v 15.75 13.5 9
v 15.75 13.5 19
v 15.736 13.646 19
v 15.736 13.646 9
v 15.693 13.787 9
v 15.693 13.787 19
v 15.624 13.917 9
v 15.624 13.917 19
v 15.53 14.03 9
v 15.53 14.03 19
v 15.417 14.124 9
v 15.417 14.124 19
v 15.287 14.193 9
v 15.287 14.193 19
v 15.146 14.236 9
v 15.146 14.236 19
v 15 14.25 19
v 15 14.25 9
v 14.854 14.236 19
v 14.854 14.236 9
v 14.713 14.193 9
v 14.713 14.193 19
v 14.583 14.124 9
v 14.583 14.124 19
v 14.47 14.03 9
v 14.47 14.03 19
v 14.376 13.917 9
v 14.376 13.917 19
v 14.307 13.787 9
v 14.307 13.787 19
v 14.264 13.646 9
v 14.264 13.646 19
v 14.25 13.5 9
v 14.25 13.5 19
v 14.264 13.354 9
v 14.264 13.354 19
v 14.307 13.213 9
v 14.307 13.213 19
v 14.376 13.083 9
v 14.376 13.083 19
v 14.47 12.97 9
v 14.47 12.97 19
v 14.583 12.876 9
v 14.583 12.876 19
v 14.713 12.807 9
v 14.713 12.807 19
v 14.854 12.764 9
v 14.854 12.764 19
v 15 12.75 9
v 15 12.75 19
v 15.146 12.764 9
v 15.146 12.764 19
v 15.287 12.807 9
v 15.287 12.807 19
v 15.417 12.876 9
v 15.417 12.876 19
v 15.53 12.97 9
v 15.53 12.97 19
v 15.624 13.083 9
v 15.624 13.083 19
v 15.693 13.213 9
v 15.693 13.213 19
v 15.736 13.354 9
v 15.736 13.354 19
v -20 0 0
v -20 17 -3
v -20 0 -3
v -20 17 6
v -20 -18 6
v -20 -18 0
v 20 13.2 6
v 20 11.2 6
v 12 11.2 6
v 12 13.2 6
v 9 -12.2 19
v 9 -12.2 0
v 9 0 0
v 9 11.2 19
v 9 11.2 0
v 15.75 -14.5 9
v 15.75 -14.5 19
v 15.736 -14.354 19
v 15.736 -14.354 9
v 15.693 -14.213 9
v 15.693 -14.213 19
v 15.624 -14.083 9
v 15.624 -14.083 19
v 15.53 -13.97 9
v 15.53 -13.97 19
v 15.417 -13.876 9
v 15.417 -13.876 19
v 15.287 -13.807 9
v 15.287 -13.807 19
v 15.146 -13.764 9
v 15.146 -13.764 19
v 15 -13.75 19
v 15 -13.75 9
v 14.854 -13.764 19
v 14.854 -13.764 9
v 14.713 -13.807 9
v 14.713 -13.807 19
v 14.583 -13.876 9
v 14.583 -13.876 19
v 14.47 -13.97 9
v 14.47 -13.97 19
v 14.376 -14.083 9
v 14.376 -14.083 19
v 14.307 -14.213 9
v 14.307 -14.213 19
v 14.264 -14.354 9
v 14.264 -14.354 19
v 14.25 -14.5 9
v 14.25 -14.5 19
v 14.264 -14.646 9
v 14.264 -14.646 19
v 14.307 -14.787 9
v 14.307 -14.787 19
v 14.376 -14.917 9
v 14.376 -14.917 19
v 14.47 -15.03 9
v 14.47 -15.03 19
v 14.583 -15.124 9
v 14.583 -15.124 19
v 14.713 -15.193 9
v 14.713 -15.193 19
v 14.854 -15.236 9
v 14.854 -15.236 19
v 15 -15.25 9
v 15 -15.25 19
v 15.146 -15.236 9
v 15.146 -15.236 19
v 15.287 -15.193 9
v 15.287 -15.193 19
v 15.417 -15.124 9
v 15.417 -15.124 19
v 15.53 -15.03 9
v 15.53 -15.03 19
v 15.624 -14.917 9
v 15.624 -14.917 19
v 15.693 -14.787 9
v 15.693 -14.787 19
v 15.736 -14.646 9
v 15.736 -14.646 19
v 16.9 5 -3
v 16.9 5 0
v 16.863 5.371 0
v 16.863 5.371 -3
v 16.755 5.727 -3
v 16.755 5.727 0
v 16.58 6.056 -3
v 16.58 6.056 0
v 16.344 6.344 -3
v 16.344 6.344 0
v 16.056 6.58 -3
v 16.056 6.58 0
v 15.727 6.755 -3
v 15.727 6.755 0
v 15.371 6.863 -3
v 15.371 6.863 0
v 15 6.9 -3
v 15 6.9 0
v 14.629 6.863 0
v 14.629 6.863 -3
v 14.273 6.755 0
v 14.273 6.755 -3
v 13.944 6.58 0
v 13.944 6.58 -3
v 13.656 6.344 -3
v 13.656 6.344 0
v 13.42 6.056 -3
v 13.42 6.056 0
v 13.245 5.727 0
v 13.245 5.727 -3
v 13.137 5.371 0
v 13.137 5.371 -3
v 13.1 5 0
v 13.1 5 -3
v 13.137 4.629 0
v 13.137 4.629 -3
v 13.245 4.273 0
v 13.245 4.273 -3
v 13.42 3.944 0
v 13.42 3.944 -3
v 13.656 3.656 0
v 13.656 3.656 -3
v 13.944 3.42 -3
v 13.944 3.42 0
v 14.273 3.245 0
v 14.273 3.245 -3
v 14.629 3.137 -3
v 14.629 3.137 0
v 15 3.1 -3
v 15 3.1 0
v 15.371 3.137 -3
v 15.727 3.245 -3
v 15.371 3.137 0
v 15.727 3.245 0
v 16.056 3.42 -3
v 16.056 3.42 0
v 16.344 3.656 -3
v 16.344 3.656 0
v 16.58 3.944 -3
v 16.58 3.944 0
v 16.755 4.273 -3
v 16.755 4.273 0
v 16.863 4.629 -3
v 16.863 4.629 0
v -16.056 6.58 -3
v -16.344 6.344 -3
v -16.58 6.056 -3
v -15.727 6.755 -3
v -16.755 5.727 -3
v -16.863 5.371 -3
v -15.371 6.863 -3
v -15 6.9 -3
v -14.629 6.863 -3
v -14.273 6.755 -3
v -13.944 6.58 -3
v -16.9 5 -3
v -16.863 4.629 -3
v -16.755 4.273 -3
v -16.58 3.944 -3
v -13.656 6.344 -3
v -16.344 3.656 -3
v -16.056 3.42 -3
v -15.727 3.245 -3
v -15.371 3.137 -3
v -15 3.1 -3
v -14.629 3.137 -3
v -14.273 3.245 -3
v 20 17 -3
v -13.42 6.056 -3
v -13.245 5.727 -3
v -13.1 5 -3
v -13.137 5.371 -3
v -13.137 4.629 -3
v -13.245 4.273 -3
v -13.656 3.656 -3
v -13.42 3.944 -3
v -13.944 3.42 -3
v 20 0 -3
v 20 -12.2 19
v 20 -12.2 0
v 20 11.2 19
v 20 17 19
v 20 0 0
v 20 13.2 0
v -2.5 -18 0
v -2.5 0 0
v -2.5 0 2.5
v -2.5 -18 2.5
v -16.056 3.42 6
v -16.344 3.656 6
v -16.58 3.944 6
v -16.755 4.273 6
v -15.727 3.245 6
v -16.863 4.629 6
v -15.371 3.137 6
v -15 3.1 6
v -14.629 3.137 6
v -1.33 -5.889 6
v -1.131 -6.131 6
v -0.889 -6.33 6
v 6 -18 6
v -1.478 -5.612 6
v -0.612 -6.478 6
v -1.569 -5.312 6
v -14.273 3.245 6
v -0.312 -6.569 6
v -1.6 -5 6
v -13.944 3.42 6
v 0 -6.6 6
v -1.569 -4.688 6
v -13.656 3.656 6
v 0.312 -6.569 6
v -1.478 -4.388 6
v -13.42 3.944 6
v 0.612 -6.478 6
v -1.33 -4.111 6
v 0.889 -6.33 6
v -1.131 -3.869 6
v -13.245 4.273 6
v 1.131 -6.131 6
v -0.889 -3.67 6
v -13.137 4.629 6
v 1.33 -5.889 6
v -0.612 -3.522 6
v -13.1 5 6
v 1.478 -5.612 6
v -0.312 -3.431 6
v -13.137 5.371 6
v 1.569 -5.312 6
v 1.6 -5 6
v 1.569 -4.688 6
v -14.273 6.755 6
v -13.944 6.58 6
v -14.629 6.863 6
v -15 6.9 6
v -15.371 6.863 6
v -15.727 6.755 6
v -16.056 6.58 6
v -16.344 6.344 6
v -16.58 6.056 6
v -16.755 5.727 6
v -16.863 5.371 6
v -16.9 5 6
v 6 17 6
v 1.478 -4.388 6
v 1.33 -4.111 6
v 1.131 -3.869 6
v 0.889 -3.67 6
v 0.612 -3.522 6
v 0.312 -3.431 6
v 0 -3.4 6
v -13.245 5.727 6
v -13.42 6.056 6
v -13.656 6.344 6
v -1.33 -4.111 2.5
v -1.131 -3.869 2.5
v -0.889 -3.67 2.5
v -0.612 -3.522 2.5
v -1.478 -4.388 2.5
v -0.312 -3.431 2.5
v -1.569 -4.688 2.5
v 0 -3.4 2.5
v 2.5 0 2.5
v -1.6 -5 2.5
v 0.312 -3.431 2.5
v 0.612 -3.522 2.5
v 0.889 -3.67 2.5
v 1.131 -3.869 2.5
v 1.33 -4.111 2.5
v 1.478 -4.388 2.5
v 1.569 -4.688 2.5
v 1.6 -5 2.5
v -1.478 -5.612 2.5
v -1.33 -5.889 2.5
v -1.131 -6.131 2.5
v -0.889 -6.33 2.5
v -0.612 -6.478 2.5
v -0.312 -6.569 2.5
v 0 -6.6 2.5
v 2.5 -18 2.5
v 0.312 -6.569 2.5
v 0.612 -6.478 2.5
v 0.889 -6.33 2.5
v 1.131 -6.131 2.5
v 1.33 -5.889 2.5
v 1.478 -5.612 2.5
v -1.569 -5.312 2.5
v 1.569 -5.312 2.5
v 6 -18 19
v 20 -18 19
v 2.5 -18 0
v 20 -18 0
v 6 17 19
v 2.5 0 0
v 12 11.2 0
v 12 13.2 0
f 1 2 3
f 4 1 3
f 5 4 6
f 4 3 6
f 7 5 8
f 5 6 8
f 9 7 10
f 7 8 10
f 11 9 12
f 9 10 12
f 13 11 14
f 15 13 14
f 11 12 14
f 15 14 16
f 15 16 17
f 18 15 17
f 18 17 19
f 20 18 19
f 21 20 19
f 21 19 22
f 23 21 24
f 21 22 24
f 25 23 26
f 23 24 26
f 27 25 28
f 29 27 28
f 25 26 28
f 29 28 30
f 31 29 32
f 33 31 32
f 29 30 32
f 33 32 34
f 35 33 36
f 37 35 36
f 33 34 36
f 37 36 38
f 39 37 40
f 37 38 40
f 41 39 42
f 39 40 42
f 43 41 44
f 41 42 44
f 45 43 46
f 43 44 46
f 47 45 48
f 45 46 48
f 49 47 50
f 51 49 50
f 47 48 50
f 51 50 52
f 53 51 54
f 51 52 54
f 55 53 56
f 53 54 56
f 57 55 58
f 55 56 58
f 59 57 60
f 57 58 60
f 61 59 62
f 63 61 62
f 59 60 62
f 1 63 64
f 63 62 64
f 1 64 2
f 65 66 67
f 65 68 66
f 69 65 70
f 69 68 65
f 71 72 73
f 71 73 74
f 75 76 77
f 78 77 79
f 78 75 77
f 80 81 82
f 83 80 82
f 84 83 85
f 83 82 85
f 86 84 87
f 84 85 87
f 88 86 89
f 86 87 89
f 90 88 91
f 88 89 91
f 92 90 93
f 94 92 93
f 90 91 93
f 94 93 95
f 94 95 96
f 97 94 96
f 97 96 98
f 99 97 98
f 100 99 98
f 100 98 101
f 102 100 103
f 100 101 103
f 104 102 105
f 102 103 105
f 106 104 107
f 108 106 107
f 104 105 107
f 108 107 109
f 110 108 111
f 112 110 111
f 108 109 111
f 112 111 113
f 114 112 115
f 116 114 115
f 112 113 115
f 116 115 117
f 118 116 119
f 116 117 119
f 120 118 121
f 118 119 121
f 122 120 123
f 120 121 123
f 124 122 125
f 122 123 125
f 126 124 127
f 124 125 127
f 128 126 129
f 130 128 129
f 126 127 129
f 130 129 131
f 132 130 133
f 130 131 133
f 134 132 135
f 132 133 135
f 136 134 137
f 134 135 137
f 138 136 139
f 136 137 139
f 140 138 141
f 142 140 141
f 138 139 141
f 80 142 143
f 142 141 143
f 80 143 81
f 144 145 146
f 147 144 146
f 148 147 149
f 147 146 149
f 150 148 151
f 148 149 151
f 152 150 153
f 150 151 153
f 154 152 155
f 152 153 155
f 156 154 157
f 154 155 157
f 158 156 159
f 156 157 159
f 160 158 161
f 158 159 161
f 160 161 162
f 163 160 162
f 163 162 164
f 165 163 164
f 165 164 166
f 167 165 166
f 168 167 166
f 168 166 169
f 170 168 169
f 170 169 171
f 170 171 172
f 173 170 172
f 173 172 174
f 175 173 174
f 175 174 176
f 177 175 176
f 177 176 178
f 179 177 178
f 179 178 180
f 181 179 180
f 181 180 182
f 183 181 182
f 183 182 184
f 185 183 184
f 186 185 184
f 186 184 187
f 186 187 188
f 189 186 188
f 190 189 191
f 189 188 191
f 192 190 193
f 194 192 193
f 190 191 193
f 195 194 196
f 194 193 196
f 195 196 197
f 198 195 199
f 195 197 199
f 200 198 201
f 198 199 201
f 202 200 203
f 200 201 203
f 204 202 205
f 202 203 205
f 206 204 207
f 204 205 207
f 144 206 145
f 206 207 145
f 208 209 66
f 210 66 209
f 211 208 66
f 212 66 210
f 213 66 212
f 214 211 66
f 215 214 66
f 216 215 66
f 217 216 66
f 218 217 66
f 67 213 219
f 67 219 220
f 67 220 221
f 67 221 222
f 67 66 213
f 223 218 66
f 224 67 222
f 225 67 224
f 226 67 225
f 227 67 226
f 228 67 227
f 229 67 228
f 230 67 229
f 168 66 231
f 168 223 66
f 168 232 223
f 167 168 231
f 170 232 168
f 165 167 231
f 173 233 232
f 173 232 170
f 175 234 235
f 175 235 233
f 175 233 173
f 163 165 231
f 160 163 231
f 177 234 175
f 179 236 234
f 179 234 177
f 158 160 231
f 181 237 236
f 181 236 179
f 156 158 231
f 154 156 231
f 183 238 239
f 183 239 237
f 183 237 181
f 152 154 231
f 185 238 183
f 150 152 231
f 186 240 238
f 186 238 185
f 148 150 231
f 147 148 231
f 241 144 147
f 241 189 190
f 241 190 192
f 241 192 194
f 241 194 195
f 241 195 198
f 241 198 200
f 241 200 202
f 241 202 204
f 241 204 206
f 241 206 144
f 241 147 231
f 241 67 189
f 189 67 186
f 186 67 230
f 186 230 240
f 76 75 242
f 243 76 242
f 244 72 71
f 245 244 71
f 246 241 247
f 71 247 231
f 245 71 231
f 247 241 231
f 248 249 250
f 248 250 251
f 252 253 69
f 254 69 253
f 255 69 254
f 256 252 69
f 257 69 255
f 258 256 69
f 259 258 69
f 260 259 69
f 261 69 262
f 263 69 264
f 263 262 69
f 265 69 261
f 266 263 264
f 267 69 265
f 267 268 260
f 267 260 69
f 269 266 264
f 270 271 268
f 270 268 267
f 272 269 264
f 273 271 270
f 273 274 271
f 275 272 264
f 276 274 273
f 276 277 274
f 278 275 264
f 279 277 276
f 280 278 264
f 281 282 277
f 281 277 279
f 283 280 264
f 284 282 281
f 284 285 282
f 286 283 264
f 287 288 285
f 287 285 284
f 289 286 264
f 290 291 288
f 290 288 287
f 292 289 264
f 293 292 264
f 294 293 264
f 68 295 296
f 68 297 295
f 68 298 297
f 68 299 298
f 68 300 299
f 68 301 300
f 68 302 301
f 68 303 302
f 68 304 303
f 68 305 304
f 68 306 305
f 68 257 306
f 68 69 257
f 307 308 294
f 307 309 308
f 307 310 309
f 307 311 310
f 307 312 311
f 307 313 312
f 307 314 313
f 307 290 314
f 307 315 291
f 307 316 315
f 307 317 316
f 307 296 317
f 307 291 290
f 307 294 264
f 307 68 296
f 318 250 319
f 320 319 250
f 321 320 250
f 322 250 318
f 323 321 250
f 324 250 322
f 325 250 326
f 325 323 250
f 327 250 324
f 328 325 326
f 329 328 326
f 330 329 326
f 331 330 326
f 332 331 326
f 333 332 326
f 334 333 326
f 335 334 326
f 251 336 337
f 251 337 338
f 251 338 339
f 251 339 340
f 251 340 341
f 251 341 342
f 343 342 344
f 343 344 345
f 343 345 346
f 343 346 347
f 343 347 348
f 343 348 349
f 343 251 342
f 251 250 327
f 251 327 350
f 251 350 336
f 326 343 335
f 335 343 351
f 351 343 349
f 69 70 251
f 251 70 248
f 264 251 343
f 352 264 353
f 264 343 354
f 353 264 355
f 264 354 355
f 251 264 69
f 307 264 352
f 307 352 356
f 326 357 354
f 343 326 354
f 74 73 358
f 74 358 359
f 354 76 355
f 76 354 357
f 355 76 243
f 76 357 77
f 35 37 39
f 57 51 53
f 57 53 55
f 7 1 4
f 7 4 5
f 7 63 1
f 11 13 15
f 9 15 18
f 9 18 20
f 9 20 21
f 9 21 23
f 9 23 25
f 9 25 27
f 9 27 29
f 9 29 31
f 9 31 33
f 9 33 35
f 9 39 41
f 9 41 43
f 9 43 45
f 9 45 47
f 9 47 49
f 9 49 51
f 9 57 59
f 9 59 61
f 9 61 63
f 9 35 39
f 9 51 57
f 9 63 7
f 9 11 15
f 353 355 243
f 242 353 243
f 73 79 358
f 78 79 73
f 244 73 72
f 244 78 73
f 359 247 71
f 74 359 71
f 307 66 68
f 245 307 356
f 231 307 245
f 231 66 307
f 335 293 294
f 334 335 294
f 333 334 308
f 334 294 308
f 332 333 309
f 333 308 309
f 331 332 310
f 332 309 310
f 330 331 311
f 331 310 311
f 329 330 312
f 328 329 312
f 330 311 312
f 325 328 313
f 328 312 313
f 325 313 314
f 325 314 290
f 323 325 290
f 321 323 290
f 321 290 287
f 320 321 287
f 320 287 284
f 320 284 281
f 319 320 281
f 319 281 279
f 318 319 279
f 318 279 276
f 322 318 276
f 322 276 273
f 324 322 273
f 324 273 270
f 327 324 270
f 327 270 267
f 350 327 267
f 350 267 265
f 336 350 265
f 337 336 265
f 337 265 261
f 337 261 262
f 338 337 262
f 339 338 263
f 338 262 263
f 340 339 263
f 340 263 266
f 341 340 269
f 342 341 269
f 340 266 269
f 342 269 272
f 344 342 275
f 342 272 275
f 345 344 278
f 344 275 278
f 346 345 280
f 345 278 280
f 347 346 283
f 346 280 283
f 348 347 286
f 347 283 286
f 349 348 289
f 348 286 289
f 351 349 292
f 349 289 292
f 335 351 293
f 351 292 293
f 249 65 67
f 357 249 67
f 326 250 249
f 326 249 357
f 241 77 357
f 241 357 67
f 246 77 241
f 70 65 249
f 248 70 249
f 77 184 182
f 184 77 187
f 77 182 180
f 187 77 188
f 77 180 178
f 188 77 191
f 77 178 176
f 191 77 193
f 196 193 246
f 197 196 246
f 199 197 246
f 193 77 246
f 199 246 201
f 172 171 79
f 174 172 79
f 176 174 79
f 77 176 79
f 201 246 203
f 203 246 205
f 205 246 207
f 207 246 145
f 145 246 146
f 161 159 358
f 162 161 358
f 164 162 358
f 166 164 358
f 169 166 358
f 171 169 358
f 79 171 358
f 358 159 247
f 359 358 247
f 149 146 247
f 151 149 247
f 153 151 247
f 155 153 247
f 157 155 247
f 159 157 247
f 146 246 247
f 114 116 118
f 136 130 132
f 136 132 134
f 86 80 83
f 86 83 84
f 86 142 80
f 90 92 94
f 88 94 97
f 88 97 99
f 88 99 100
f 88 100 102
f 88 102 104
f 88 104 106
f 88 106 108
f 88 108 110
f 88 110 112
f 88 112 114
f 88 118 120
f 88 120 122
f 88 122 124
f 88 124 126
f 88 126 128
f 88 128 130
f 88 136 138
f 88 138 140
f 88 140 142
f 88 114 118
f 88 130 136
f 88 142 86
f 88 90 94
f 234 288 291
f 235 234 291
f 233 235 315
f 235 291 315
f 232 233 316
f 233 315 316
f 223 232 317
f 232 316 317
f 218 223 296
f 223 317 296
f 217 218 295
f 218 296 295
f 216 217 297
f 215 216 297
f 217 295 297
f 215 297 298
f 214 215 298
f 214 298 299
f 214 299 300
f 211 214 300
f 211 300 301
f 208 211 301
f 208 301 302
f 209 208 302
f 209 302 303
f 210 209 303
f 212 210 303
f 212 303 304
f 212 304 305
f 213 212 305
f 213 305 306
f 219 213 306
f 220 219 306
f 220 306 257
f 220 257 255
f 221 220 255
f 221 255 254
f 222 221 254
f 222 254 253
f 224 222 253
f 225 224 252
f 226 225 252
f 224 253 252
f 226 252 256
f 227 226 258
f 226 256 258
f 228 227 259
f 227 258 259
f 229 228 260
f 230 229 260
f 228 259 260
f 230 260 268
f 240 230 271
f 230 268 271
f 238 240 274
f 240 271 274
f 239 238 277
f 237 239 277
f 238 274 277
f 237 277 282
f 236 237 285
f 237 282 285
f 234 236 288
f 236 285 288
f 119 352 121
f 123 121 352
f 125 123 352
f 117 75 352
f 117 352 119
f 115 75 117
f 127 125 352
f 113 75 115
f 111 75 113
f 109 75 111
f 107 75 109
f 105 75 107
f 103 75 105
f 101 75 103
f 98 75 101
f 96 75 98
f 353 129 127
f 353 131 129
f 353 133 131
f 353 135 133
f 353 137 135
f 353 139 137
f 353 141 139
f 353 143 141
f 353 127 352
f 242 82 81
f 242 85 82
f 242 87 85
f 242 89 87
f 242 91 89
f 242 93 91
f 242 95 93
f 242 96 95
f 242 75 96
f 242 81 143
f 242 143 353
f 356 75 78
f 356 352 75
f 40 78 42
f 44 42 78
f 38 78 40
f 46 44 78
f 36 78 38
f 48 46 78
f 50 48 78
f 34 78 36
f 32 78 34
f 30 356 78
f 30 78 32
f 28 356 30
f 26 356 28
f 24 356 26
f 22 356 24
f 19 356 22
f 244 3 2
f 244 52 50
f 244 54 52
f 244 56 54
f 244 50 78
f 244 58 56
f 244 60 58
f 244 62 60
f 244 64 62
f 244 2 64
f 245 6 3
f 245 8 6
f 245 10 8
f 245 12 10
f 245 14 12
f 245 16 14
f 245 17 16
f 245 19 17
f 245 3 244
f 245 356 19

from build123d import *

# Parameters (mm, degrees)
SKETCH_W        = 40
SKETCH_H        = 35
PAD_DEPTH       = 6
SKETCH002_W     = 40
SKETCH002_H     = 17
PAD001_DEPTH    = 3
SKETCH001_R     = 1.9
SKETCH001_R_2   = 1.6
POCKET_DEPTH    = 9.001
SKETCH003_W     = 14
SKETCH003_H     = 35
PAD002_DEPTH    = 13
SKETCH004_W     = 11
SKETCH004_H     = 23.4
POCKET001_DEPTH = 19
SKETCH005_R     = 0.75
POCKET002_DEPTH = 10
SKETCH006_W     = 2
SKETCH006_H     = 6
POCKET003_DEPTH = 8
SKETCH007_W     = 5
SKETCH007_H     = 18
POCKET004_DEPTH = 2.5


with BuildPart() as part:
    # Sketch → Pad (new body)
    with BuildSketch(Plane.XY):
        with Locations((0, -0.5)):
            Rectangle(SKETCH_W, SKETCH_H)
    extrude(amount=PAD_DEPTH)

    # Sketch002 (on Face5 of Pad) → Pad001 (join)
    with BuildSketch(Plane(origin=(0, 0, 0), x_dir=(1, 0, 0), z_dir=(0, 0, -1))):
        with Locations((0, -8.5)):
            Rectangle(SKETCH002_W, SKETCH002_H)
    extrude(amount=PAD001_DEPTH)

    # Sketch001 (on Face6 of Pad) → Pocket (cut, through all)
    with BuildSketch(Plane.XY.offset(6)):
        with Locations((-15, 5)):
            Circle(SKETCH001_R)
        with Locations((15, 5)):
            Circle(SKETCH001_R)
        with Locations((0, -5)):
            Circle(SKETCH001_R_2)
    extrude(amount=-POCKET_DEPTH, mode=Mode.SUBTRACT)

    # Sketch003 (on Face1 of Pocket) → Pad002 (join)
    with BuildSketch(Plane.XY.offset(6)):
        with Locations((13, -0.5)):
            Rectangle(SKETCH003_W, SKETCH003_H)
    extrude(amount=PAD002_DEPTH)

    # Sketch004 (on Face9 of Pad002) → Pocket001 (cut)
    with BuildSketch(Plane.XY.offset(19)):
        with Locations((14.5, -0.5)):
            Rectangle(SKETCH004_W, SKETCH004_H)
    extrude(amount=-POCKET001_DEPTH, mode=Mode.SUBTRACT)

    # Sketch005 (on Face12 of Pocket001) → Pocket002 (cut)
    with BuildSketch(Plane.XY.offset(19)):
        with Locations((15, 13.5)):
            Circle(SKETCH005_R)
        with Locations((15, -14.5)):
            Circle(SKETCH005_R)
    extrude(amount=-POCKET002_DEPTH, mode=Mode.SUBTRACT)

    # Sketch006 (on Face11 of Pocket002) → Pocket003 (cut)
    with BuildSketch(Plane.YZ.offset(20)):
        with Locations((12.2, 3)):
            Rectangle(SKETCH006_W, SKETCH006_H)
    extrude(amount=-POCKET003_DEPTH, mode=Mode.SUBTRACT)

    # Sketch007 (on Face10 of Pocket003) → Pocket004 (cut)
    with BuildSketch(Plane(origin=(0, 0, 0), x_dir=(1, 0, 0), z_dir=(0, 0, -1))):
        with Locations((0, 9)):
            Rectangle(SKETCH007_W, SKETCH007_H)
    extrude(amount=-POCKET004_DEPTH, mode=Mode.SUBTRACT)


solid = part.part
